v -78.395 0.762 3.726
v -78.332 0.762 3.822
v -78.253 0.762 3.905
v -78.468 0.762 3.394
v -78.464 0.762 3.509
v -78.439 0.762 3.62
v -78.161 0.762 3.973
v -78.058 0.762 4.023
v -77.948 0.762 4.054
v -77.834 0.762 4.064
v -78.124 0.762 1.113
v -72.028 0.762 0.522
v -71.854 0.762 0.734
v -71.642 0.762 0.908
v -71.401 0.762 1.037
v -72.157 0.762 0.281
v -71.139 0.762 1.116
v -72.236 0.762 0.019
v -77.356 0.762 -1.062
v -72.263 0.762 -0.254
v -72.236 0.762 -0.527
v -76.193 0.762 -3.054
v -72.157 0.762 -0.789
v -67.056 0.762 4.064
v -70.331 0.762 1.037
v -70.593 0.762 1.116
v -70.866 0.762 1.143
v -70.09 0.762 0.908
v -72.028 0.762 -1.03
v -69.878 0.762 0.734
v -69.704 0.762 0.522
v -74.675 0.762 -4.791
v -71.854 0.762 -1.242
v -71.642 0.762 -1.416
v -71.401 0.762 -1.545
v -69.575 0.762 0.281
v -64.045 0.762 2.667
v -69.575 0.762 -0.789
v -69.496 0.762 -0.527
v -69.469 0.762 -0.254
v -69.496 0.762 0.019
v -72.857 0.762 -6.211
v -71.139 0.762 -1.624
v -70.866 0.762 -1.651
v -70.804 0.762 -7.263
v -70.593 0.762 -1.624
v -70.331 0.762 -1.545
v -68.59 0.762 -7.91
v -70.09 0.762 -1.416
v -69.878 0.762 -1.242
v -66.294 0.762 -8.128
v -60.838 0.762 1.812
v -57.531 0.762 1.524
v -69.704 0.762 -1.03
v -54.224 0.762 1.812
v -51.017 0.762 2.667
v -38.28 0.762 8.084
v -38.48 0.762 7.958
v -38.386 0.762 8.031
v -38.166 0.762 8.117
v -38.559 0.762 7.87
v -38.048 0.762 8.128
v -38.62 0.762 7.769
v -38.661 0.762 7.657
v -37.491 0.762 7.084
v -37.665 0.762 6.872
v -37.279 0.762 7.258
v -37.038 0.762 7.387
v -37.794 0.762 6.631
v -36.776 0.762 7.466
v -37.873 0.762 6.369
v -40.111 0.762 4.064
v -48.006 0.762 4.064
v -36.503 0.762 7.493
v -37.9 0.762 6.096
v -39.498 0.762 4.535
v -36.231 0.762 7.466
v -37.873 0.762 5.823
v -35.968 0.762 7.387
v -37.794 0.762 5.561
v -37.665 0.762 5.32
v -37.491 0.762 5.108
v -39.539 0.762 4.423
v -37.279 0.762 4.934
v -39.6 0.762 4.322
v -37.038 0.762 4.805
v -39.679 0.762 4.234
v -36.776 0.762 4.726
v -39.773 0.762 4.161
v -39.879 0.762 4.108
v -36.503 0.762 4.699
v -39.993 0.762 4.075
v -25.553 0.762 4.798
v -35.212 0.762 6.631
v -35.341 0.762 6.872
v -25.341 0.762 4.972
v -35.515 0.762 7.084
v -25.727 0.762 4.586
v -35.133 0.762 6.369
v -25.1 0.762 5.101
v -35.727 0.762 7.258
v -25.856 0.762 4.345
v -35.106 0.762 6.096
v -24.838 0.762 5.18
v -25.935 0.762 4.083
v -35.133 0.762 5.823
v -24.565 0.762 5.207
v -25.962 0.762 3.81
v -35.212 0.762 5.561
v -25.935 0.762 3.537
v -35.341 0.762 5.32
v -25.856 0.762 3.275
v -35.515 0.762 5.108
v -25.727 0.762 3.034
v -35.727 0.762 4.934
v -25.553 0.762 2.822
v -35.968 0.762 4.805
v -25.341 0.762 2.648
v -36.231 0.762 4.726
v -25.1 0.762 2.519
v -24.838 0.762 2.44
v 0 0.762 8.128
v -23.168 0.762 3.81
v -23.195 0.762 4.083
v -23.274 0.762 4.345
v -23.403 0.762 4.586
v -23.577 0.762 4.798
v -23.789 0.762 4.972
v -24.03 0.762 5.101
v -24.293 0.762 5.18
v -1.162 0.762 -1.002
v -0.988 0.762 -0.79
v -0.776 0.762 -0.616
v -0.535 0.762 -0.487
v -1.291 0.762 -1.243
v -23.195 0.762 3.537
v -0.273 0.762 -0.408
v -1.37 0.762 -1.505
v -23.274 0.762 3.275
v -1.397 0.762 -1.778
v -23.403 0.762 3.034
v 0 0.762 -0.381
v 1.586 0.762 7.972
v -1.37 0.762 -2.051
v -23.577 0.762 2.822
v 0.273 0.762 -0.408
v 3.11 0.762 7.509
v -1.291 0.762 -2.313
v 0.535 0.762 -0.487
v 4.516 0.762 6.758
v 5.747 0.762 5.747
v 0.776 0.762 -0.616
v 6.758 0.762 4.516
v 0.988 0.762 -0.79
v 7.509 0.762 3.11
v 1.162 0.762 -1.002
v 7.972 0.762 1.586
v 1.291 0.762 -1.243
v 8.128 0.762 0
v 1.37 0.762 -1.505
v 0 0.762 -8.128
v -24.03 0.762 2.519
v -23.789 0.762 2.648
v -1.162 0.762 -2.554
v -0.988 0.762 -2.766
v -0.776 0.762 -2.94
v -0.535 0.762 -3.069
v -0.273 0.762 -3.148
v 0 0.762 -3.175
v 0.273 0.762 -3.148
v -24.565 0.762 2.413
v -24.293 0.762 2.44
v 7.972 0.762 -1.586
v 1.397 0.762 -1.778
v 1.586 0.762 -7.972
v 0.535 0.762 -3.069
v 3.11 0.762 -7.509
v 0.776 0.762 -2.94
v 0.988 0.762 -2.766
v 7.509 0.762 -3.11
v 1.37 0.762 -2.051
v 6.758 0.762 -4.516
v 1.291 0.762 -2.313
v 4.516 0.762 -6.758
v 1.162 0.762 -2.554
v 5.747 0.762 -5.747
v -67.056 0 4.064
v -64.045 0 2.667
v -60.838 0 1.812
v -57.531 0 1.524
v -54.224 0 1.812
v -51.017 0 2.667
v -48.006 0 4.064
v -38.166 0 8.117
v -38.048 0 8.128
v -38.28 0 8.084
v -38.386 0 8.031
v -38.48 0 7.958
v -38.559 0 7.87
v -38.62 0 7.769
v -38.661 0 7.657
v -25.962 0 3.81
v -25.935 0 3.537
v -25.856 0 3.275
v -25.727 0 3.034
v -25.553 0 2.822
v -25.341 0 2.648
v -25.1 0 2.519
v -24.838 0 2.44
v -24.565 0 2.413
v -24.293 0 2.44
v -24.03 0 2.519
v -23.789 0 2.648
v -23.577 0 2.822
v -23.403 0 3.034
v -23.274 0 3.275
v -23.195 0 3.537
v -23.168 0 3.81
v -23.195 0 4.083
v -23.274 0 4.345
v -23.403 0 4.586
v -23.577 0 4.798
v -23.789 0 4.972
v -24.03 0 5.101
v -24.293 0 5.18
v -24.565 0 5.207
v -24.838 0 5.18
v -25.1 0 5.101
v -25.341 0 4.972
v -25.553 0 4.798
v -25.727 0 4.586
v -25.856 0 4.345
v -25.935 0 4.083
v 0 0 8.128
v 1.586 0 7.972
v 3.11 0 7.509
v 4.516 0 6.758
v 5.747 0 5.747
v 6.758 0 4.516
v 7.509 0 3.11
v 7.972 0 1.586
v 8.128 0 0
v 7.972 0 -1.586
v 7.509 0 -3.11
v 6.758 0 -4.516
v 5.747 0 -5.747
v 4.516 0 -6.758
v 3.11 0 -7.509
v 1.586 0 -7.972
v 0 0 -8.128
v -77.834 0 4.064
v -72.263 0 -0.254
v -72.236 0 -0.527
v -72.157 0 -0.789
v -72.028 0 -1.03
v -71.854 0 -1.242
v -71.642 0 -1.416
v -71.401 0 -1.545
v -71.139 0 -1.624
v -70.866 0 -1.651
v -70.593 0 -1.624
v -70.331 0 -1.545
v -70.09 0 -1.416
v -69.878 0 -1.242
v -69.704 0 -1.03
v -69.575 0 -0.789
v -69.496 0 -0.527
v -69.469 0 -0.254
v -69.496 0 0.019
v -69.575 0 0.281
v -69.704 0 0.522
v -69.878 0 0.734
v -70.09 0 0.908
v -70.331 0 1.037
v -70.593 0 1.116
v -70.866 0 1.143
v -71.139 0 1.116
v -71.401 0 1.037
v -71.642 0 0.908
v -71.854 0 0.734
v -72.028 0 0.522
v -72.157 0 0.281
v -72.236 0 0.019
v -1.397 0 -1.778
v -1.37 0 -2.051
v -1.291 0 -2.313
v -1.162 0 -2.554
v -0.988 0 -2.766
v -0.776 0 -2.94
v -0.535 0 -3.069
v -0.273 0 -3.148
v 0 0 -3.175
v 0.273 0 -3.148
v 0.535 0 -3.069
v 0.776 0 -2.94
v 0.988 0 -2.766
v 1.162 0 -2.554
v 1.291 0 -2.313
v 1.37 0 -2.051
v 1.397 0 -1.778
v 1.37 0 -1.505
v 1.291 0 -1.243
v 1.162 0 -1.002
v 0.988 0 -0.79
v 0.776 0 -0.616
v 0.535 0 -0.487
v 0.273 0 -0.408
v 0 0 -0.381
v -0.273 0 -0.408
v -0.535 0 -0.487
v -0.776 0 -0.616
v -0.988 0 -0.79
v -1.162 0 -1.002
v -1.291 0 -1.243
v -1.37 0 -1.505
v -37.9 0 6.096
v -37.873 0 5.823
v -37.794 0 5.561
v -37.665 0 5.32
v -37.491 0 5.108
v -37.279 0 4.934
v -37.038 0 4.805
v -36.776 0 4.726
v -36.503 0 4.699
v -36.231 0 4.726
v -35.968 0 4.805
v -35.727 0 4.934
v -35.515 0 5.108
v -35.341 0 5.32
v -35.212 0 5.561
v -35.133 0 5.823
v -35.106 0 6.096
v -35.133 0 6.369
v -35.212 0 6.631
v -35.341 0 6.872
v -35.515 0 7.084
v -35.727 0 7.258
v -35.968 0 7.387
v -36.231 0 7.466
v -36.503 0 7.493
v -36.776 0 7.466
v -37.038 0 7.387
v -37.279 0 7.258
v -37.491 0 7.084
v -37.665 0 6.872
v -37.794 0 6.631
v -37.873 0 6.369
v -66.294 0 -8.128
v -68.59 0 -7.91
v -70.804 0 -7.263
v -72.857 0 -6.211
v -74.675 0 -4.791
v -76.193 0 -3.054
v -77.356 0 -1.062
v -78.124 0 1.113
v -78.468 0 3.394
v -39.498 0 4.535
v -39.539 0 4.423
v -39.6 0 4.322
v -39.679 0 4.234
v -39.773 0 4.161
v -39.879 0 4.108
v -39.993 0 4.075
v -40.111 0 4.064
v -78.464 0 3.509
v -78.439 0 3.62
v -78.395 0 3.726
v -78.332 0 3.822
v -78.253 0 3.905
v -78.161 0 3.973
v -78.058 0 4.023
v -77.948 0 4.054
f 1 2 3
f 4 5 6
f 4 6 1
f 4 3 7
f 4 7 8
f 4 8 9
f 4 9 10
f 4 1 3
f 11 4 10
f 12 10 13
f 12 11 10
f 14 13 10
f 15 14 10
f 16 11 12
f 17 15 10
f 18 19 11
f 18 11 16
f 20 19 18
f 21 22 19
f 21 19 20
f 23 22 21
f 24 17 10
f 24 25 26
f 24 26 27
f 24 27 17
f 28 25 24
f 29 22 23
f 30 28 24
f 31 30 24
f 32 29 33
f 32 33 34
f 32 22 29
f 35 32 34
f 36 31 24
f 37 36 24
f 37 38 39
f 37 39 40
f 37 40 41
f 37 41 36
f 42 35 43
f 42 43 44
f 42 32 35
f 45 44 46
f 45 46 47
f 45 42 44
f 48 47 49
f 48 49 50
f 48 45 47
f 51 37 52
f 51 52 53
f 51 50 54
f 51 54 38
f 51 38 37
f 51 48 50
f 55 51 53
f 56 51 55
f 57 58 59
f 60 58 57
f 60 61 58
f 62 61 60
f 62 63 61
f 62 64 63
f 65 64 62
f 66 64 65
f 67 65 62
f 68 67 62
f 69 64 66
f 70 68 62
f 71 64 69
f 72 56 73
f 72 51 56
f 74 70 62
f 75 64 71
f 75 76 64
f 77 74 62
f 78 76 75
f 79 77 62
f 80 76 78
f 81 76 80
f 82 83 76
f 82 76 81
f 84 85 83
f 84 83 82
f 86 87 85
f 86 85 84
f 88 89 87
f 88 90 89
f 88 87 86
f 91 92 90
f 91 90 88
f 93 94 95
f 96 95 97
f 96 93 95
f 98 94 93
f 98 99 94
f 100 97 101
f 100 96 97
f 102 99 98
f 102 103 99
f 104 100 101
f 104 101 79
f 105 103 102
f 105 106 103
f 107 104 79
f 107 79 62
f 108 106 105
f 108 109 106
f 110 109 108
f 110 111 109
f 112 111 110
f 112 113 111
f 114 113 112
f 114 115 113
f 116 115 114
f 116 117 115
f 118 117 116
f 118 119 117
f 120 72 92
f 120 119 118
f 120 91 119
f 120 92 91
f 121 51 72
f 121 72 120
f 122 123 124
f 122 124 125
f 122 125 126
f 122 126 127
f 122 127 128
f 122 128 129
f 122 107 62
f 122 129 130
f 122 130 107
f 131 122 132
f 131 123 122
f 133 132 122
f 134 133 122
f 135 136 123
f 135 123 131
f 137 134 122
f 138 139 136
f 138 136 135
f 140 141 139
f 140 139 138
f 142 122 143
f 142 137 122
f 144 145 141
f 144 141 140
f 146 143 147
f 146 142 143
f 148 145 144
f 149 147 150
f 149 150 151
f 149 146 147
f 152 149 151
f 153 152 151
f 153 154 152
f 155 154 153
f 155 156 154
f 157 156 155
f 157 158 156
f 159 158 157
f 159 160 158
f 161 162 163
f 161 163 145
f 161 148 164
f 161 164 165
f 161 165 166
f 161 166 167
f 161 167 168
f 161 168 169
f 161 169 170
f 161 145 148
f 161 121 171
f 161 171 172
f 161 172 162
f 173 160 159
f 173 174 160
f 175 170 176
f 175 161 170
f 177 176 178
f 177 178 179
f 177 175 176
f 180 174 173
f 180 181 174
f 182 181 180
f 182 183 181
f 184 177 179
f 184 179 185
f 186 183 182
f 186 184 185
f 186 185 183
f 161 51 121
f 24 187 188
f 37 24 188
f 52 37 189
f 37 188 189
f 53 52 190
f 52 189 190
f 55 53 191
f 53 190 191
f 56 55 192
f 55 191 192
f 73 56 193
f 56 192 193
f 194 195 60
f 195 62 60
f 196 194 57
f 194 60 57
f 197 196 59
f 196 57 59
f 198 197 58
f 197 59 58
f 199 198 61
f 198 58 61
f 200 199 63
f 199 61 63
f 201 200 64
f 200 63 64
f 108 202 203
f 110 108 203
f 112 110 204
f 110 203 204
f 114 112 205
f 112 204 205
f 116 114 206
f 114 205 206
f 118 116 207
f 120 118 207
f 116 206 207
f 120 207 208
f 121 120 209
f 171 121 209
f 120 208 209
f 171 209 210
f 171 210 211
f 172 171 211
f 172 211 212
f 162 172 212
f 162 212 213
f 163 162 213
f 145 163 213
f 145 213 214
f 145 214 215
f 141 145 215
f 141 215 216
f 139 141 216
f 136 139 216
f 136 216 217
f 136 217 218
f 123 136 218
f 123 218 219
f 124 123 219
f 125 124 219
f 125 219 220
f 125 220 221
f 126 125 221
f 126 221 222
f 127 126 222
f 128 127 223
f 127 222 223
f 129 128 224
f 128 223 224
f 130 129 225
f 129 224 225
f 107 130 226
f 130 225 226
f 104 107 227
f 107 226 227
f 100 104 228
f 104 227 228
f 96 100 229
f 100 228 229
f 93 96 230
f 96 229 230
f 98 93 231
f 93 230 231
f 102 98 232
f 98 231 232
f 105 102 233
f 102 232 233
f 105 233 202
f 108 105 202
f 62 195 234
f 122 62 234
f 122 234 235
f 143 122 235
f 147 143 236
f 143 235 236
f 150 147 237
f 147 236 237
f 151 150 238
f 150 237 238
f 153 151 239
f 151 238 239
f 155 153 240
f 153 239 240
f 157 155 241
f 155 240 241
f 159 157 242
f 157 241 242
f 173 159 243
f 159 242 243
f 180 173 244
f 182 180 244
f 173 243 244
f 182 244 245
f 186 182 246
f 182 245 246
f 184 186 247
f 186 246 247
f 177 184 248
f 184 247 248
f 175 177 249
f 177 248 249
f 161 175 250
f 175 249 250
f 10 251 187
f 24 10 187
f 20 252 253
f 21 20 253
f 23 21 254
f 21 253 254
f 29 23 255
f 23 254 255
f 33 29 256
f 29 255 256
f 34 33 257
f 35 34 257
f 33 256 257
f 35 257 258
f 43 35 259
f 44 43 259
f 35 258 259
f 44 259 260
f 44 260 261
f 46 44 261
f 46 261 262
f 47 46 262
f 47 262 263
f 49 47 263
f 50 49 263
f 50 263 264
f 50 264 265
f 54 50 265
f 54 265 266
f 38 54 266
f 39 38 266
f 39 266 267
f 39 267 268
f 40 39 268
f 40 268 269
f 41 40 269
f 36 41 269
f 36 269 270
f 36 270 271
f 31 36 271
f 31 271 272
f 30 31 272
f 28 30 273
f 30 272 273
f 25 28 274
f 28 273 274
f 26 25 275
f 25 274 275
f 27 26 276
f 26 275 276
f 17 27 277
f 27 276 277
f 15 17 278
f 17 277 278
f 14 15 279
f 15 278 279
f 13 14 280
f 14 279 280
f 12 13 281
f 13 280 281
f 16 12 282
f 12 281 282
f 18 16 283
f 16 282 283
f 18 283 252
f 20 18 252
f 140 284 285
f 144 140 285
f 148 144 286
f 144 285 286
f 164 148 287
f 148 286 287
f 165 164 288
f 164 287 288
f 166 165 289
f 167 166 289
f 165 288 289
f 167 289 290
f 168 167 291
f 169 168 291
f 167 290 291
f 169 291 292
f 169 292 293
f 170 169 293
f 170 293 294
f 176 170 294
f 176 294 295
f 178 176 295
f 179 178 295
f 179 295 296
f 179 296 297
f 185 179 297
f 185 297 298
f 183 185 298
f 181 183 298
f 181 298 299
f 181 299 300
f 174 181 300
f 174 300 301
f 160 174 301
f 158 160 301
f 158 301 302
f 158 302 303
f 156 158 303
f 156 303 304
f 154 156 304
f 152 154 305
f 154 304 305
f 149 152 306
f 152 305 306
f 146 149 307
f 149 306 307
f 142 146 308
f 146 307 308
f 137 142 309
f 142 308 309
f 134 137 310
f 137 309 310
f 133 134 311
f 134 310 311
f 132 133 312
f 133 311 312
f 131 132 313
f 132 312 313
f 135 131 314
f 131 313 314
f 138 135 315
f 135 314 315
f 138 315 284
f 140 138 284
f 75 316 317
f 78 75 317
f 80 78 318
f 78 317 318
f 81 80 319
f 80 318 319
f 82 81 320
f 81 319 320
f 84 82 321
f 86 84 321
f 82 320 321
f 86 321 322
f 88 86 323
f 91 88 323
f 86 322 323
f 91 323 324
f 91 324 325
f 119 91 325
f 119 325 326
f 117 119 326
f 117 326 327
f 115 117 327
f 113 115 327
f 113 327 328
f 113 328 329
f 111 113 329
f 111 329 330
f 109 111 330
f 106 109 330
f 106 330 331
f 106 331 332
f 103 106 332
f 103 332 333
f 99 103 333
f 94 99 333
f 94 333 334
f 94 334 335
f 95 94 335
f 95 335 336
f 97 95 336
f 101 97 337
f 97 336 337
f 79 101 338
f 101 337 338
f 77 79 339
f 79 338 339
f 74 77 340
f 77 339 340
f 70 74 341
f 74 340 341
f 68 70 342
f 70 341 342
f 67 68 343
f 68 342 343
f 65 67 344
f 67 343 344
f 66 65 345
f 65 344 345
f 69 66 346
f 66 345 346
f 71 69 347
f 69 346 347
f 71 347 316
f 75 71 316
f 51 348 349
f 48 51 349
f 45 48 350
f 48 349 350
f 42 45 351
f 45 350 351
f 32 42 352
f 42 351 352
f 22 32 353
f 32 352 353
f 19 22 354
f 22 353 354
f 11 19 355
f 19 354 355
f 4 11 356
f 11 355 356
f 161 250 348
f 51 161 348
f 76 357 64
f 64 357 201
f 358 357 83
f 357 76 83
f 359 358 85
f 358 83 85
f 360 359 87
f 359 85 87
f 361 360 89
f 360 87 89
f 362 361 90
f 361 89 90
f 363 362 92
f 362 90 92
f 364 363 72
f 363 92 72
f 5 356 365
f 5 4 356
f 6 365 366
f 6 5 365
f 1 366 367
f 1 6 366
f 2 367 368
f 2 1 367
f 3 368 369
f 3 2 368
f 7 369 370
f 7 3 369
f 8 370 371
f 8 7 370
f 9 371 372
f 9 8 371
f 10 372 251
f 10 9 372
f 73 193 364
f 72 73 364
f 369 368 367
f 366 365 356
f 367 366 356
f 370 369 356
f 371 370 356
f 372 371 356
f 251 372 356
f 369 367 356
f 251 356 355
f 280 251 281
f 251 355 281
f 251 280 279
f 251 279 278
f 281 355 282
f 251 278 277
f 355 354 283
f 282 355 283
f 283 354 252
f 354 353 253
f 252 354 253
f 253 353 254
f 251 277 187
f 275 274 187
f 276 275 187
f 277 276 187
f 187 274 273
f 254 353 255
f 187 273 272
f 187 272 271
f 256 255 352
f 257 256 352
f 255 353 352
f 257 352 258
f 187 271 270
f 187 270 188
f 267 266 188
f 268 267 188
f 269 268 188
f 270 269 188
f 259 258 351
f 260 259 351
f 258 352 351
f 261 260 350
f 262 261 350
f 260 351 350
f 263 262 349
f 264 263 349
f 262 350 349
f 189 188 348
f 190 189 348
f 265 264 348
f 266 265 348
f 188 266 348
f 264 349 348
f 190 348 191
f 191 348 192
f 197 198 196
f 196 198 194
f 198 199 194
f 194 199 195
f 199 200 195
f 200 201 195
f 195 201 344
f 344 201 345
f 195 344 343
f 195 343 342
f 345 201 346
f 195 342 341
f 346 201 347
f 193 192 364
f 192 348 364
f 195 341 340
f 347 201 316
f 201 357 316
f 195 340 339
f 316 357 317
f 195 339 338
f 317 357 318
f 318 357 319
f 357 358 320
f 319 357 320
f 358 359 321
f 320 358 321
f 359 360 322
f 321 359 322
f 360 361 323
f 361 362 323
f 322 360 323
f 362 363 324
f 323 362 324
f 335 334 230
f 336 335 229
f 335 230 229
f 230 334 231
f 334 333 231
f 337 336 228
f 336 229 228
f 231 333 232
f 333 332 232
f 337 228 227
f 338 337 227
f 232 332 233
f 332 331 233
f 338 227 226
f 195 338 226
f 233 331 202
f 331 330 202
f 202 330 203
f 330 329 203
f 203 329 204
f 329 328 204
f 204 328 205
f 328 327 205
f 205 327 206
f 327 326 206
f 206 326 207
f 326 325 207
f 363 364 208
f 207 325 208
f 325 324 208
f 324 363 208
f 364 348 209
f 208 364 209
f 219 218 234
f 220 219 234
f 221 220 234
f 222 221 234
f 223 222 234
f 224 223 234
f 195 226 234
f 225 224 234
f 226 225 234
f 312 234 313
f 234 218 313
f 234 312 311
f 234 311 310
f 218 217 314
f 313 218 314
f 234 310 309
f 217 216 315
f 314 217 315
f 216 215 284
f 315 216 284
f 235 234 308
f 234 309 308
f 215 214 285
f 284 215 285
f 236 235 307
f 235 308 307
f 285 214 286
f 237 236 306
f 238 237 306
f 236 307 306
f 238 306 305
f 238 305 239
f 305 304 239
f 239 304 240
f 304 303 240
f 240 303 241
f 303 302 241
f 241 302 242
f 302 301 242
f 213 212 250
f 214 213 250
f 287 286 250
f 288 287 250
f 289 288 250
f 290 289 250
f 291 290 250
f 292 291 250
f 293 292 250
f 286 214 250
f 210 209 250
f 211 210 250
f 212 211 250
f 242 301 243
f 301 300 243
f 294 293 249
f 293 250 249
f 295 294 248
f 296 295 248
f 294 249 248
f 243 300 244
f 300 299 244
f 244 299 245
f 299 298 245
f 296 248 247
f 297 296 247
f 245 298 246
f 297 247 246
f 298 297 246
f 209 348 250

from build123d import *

# Parameters (mm, degrees)
BOSS_EXTRUDE1_DEPTH         = 0.762
F_3_8_0_11_DIAMETER_HOLE1_D = 2.794
FILLET1_R                   = 0.635


with BuildPart() as part:
    # Sketch1 → Boss-Extrude1 (new body)
    with BuildSketch(Plane(origin=(0, 0, 0), x_dir=(1, 0, 0), z_dir=(0, 1, 0))):
        with BuildLine():
            Line((0, 8.128), (-66.294, 8.128))
            ThreePointArc((-66.294, 8.128), (-74.915045876, 4.557045876), (-78.486, -4.064))
            Line((-78.486, -4.064), (-67.056, -4.064))
            ThreePointArc((-67.056, -4.064), (-57.531, -1.524), (-48.006, -4.064))
            Line((-48.006, -4.064), (-39.624, -4.064))
            Line((-39.624, -4.064), (-38.535054482, -8.128))
            Line((-38.535054482, -8.128), (0, -8.128))
            ThreePointArc((0, -8.128), (8.128, 0), (0, 8.128))
        make_face()
    extrude(amount=BOSS_EXTRUDE1_DEPTH)

    # 3/8 (0.11) Diameter Hole1 (through all)
    with Locations(Plane(origin=(0, 0.762, 0), x_dir=(1, 0, 0), z_dir=(0, 1, 0))):
        with Locations((-70.866, 0.254), (-36.503054482, -6.096), (-24.565054482, -3.81), (0, 1.778)):
            Hole(F_3_8_0_11_DIAMETER_HOLE1_D / 2)

    # Fillet1
    fillet1_edges = [part.edges().sort_by_distance(p)[0] for p in [
        (-38.535054482, 0.381, 8.128),
        (-39.624, 0.381, 4.064),
        (-78.486, 0.381, 4.064),
    ]]
    fillet(fillet1_edges, radius=FILLET1_R)


solid = part.part
